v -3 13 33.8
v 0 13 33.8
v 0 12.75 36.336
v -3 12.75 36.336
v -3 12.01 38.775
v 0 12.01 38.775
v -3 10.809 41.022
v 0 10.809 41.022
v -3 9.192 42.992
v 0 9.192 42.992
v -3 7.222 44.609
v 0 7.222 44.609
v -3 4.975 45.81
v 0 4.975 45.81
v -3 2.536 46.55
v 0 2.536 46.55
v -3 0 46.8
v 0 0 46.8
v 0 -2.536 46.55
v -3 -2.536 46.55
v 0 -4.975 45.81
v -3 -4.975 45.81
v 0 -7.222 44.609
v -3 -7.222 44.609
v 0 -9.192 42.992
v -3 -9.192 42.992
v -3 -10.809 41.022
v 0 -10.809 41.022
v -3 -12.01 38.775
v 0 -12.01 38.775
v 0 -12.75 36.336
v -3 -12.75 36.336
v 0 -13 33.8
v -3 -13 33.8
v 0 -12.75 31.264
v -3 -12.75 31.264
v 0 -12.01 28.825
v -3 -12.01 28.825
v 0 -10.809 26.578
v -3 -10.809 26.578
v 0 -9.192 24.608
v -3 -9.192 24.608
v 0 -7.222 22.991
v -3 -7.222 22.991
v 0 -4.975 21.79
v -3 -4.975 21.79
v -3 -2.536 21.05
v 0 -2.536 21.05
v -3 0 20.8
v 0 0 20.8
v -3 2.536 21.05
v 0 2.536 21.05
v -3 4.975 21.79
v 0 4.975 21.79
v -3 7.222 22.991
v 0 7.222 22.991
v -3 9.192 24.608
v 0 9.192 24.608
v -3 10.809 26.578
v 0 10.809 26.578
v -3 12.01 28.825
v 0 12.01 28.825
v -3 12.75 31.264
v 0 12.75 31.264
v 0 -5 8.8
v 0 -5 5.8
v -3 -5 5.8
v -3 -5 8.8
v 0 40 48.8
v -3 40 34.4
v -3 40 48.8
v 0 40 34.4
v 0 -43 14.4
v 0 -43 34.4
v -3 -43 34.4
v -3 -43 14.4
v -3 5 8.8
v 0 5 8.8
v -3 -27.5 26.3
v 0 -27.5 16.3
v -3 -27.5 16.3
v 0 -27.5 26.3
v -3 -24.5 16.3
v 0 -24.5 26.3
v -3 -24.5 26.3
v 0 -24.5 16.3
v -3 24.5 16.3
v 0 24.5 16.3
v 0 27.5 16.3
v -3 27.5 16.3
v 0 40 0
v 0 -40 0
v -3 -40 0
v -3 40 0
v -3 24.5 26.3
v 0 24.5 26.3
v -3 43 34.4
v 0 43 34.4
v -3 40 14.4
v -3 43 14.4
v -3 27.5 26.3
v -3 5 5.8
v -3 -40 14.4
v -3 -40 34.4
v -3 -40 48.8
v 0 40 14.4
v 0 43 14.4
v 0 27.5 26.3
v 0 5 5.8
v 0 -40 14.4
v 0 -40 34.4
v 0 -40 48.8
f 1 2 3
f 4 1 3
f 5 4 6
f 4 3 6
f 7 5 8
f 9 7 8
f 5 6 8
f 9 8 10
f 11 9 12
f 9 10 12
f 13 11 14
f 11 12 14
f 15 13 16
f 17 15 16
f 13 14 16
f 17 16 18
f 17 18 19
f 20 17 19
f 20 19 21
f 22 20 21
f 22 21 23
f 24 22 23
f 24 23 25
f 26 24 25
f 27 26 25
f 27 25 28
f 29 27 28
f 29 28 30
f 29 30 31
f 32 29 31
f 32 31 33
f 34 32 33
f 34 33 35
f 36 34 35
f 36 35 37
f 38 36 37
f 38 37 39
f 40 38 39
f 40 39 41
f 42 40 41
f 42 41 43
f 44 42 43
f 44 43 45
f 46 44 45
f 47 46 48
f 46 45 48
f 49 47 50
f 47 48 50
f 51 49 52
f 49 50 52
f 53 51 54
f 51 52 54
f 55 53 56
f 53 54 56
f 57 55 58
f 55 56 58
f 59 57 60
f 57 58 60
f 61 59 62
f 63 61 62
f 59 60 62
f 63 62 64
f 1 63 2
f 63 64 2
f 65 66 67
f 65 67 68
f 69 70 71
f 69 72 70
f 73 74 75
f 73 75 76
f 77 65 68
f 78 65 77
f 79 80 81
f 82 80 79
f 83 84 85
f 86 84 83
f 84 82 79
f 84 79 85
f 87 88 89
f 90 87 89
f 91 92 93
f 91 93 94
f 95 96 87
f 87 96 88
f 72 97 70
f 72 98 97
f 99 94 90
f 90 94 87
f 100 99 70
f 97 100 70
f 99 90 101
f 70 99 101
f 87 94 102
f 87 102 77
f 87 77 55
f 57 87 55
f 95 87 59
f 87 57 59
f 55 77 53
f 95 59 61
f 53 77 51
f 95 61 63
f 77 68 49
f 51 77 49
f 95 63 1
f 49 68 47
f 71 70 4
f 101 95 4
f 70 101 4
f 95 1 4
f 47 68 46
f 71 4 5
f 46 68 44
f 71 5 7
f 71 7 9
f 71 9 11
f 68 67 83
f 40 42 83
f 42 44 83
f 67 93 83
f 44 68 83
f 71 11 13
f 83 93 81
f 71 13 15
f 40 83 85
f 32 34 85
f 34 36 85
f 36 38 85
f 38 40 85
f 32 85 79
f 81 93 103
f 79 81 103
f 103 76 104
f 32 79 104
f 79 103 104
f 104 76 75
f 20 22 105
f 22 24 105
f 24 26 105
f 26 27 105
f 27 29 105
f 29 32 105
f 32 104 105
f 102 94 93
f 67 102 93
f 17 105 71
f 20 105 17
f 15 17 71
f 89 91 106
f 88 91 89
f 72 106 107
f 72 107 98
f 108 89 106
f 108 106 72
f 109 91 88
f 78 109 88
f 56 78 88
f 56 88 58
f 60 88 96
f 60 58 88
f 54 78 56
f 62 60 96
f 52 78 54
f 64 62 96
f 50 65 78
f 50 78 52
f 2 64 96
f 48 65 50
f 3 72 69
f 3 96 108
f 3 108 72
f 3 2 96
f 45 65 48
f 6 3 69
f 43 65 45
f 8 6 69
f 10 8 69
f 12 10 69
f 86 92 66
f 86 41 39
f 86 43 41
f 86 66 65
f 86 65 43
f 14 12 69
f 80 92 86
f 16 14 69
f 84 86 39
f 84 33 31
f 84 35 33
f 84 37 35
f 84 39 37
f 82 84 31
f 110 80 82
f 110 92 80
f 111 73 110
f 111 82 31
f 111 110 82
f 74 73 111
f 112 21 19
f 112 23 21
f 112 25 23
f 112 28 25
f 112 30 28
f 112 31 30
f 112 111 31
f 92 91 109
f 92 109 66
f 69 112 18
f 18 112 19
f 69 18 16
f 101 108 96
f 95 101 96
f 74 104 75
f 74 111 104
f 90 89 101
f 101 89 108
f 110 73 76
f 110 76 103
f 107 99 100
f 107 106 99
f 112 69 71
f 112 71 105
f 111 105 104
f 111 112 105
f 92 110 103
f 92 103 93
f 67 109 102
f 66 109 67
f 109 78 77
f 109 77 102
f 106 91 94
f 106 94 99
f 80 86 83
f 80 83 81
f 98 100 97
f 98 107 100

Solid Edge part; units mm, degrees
sketch "Sketch1" plane through (0, 0, 0) normal (1, 0, 0) x (0, 1, 0)
  line L0 (-5, 8.8) -> (5, 8.8)
  line L1 (5, 8.8) -> (5, 5.8)
  line L2 (5, 5.8) -> (-5, 5.8)
  line L3 (-5, 5.8) -> (-5, 8.8)
  line L4 (24.5, 26.3) -> (24.5, 16.3)
  line L5 (24.5, 16.3) -> (27.5, 16.3)
  line L6 (27.5, 16.3) -> (27.5, 26.3)
  line L7 (27.5, 26.3) -> (24.5, 26.3)
  line L8 (-24.5, 26.3) -> (-24.5, 16.3)
  line L9 (-24.5, 16.3) -> (-27.5, 16.3)
  line L10 (-27.5, 16.3) -> (-27.5, 26.3)
  line L11 (-27.5, 26.3) -> (-24.5, 26.3)
  circle A0 centre (0, 33.8) radius 13
  line L12 (-40, 48.8) -> (-40, 34.4)
  line L13 (-40, 34.4) -> (-43, 34.4)
  line L14 (-43, 34.4) -> (-43, 14.4)
  line L15 (-43, 14.4) -> (-40, 14.4)
  line L16 (-40, 14.4) -> (-40, 0)
  line L17 (-40, 0) -> (40, 0)
  line L18 (40, 0) -> (40, 14.4)
  line L19 (40, 14.4) -> (43, 14.4)
  line L20 (43, 14.4) -> (43, 34.4)
  line L21 (43, 34.4) -> (40, 34.4)
  line L22 (40, 34.4) -> (40, 48.8)
  line L23 (40, 48.8) -> (-40, 48.8)
  dimension "D1" = 20
  dimension "D2" = 3
  dimension "D3" = 10
  dimension "D4" = 49
  dimension "D5" = 40
  dimension "D6" = 14.4
  dimension "D7" = 7.5
  dimension "D8" = 80
  dimension "D9" = 26
  dimension "D10" = 25
extrude "Protrusion1" add sketch "Sketch1" against normal blind 3
properties material "Acier"
